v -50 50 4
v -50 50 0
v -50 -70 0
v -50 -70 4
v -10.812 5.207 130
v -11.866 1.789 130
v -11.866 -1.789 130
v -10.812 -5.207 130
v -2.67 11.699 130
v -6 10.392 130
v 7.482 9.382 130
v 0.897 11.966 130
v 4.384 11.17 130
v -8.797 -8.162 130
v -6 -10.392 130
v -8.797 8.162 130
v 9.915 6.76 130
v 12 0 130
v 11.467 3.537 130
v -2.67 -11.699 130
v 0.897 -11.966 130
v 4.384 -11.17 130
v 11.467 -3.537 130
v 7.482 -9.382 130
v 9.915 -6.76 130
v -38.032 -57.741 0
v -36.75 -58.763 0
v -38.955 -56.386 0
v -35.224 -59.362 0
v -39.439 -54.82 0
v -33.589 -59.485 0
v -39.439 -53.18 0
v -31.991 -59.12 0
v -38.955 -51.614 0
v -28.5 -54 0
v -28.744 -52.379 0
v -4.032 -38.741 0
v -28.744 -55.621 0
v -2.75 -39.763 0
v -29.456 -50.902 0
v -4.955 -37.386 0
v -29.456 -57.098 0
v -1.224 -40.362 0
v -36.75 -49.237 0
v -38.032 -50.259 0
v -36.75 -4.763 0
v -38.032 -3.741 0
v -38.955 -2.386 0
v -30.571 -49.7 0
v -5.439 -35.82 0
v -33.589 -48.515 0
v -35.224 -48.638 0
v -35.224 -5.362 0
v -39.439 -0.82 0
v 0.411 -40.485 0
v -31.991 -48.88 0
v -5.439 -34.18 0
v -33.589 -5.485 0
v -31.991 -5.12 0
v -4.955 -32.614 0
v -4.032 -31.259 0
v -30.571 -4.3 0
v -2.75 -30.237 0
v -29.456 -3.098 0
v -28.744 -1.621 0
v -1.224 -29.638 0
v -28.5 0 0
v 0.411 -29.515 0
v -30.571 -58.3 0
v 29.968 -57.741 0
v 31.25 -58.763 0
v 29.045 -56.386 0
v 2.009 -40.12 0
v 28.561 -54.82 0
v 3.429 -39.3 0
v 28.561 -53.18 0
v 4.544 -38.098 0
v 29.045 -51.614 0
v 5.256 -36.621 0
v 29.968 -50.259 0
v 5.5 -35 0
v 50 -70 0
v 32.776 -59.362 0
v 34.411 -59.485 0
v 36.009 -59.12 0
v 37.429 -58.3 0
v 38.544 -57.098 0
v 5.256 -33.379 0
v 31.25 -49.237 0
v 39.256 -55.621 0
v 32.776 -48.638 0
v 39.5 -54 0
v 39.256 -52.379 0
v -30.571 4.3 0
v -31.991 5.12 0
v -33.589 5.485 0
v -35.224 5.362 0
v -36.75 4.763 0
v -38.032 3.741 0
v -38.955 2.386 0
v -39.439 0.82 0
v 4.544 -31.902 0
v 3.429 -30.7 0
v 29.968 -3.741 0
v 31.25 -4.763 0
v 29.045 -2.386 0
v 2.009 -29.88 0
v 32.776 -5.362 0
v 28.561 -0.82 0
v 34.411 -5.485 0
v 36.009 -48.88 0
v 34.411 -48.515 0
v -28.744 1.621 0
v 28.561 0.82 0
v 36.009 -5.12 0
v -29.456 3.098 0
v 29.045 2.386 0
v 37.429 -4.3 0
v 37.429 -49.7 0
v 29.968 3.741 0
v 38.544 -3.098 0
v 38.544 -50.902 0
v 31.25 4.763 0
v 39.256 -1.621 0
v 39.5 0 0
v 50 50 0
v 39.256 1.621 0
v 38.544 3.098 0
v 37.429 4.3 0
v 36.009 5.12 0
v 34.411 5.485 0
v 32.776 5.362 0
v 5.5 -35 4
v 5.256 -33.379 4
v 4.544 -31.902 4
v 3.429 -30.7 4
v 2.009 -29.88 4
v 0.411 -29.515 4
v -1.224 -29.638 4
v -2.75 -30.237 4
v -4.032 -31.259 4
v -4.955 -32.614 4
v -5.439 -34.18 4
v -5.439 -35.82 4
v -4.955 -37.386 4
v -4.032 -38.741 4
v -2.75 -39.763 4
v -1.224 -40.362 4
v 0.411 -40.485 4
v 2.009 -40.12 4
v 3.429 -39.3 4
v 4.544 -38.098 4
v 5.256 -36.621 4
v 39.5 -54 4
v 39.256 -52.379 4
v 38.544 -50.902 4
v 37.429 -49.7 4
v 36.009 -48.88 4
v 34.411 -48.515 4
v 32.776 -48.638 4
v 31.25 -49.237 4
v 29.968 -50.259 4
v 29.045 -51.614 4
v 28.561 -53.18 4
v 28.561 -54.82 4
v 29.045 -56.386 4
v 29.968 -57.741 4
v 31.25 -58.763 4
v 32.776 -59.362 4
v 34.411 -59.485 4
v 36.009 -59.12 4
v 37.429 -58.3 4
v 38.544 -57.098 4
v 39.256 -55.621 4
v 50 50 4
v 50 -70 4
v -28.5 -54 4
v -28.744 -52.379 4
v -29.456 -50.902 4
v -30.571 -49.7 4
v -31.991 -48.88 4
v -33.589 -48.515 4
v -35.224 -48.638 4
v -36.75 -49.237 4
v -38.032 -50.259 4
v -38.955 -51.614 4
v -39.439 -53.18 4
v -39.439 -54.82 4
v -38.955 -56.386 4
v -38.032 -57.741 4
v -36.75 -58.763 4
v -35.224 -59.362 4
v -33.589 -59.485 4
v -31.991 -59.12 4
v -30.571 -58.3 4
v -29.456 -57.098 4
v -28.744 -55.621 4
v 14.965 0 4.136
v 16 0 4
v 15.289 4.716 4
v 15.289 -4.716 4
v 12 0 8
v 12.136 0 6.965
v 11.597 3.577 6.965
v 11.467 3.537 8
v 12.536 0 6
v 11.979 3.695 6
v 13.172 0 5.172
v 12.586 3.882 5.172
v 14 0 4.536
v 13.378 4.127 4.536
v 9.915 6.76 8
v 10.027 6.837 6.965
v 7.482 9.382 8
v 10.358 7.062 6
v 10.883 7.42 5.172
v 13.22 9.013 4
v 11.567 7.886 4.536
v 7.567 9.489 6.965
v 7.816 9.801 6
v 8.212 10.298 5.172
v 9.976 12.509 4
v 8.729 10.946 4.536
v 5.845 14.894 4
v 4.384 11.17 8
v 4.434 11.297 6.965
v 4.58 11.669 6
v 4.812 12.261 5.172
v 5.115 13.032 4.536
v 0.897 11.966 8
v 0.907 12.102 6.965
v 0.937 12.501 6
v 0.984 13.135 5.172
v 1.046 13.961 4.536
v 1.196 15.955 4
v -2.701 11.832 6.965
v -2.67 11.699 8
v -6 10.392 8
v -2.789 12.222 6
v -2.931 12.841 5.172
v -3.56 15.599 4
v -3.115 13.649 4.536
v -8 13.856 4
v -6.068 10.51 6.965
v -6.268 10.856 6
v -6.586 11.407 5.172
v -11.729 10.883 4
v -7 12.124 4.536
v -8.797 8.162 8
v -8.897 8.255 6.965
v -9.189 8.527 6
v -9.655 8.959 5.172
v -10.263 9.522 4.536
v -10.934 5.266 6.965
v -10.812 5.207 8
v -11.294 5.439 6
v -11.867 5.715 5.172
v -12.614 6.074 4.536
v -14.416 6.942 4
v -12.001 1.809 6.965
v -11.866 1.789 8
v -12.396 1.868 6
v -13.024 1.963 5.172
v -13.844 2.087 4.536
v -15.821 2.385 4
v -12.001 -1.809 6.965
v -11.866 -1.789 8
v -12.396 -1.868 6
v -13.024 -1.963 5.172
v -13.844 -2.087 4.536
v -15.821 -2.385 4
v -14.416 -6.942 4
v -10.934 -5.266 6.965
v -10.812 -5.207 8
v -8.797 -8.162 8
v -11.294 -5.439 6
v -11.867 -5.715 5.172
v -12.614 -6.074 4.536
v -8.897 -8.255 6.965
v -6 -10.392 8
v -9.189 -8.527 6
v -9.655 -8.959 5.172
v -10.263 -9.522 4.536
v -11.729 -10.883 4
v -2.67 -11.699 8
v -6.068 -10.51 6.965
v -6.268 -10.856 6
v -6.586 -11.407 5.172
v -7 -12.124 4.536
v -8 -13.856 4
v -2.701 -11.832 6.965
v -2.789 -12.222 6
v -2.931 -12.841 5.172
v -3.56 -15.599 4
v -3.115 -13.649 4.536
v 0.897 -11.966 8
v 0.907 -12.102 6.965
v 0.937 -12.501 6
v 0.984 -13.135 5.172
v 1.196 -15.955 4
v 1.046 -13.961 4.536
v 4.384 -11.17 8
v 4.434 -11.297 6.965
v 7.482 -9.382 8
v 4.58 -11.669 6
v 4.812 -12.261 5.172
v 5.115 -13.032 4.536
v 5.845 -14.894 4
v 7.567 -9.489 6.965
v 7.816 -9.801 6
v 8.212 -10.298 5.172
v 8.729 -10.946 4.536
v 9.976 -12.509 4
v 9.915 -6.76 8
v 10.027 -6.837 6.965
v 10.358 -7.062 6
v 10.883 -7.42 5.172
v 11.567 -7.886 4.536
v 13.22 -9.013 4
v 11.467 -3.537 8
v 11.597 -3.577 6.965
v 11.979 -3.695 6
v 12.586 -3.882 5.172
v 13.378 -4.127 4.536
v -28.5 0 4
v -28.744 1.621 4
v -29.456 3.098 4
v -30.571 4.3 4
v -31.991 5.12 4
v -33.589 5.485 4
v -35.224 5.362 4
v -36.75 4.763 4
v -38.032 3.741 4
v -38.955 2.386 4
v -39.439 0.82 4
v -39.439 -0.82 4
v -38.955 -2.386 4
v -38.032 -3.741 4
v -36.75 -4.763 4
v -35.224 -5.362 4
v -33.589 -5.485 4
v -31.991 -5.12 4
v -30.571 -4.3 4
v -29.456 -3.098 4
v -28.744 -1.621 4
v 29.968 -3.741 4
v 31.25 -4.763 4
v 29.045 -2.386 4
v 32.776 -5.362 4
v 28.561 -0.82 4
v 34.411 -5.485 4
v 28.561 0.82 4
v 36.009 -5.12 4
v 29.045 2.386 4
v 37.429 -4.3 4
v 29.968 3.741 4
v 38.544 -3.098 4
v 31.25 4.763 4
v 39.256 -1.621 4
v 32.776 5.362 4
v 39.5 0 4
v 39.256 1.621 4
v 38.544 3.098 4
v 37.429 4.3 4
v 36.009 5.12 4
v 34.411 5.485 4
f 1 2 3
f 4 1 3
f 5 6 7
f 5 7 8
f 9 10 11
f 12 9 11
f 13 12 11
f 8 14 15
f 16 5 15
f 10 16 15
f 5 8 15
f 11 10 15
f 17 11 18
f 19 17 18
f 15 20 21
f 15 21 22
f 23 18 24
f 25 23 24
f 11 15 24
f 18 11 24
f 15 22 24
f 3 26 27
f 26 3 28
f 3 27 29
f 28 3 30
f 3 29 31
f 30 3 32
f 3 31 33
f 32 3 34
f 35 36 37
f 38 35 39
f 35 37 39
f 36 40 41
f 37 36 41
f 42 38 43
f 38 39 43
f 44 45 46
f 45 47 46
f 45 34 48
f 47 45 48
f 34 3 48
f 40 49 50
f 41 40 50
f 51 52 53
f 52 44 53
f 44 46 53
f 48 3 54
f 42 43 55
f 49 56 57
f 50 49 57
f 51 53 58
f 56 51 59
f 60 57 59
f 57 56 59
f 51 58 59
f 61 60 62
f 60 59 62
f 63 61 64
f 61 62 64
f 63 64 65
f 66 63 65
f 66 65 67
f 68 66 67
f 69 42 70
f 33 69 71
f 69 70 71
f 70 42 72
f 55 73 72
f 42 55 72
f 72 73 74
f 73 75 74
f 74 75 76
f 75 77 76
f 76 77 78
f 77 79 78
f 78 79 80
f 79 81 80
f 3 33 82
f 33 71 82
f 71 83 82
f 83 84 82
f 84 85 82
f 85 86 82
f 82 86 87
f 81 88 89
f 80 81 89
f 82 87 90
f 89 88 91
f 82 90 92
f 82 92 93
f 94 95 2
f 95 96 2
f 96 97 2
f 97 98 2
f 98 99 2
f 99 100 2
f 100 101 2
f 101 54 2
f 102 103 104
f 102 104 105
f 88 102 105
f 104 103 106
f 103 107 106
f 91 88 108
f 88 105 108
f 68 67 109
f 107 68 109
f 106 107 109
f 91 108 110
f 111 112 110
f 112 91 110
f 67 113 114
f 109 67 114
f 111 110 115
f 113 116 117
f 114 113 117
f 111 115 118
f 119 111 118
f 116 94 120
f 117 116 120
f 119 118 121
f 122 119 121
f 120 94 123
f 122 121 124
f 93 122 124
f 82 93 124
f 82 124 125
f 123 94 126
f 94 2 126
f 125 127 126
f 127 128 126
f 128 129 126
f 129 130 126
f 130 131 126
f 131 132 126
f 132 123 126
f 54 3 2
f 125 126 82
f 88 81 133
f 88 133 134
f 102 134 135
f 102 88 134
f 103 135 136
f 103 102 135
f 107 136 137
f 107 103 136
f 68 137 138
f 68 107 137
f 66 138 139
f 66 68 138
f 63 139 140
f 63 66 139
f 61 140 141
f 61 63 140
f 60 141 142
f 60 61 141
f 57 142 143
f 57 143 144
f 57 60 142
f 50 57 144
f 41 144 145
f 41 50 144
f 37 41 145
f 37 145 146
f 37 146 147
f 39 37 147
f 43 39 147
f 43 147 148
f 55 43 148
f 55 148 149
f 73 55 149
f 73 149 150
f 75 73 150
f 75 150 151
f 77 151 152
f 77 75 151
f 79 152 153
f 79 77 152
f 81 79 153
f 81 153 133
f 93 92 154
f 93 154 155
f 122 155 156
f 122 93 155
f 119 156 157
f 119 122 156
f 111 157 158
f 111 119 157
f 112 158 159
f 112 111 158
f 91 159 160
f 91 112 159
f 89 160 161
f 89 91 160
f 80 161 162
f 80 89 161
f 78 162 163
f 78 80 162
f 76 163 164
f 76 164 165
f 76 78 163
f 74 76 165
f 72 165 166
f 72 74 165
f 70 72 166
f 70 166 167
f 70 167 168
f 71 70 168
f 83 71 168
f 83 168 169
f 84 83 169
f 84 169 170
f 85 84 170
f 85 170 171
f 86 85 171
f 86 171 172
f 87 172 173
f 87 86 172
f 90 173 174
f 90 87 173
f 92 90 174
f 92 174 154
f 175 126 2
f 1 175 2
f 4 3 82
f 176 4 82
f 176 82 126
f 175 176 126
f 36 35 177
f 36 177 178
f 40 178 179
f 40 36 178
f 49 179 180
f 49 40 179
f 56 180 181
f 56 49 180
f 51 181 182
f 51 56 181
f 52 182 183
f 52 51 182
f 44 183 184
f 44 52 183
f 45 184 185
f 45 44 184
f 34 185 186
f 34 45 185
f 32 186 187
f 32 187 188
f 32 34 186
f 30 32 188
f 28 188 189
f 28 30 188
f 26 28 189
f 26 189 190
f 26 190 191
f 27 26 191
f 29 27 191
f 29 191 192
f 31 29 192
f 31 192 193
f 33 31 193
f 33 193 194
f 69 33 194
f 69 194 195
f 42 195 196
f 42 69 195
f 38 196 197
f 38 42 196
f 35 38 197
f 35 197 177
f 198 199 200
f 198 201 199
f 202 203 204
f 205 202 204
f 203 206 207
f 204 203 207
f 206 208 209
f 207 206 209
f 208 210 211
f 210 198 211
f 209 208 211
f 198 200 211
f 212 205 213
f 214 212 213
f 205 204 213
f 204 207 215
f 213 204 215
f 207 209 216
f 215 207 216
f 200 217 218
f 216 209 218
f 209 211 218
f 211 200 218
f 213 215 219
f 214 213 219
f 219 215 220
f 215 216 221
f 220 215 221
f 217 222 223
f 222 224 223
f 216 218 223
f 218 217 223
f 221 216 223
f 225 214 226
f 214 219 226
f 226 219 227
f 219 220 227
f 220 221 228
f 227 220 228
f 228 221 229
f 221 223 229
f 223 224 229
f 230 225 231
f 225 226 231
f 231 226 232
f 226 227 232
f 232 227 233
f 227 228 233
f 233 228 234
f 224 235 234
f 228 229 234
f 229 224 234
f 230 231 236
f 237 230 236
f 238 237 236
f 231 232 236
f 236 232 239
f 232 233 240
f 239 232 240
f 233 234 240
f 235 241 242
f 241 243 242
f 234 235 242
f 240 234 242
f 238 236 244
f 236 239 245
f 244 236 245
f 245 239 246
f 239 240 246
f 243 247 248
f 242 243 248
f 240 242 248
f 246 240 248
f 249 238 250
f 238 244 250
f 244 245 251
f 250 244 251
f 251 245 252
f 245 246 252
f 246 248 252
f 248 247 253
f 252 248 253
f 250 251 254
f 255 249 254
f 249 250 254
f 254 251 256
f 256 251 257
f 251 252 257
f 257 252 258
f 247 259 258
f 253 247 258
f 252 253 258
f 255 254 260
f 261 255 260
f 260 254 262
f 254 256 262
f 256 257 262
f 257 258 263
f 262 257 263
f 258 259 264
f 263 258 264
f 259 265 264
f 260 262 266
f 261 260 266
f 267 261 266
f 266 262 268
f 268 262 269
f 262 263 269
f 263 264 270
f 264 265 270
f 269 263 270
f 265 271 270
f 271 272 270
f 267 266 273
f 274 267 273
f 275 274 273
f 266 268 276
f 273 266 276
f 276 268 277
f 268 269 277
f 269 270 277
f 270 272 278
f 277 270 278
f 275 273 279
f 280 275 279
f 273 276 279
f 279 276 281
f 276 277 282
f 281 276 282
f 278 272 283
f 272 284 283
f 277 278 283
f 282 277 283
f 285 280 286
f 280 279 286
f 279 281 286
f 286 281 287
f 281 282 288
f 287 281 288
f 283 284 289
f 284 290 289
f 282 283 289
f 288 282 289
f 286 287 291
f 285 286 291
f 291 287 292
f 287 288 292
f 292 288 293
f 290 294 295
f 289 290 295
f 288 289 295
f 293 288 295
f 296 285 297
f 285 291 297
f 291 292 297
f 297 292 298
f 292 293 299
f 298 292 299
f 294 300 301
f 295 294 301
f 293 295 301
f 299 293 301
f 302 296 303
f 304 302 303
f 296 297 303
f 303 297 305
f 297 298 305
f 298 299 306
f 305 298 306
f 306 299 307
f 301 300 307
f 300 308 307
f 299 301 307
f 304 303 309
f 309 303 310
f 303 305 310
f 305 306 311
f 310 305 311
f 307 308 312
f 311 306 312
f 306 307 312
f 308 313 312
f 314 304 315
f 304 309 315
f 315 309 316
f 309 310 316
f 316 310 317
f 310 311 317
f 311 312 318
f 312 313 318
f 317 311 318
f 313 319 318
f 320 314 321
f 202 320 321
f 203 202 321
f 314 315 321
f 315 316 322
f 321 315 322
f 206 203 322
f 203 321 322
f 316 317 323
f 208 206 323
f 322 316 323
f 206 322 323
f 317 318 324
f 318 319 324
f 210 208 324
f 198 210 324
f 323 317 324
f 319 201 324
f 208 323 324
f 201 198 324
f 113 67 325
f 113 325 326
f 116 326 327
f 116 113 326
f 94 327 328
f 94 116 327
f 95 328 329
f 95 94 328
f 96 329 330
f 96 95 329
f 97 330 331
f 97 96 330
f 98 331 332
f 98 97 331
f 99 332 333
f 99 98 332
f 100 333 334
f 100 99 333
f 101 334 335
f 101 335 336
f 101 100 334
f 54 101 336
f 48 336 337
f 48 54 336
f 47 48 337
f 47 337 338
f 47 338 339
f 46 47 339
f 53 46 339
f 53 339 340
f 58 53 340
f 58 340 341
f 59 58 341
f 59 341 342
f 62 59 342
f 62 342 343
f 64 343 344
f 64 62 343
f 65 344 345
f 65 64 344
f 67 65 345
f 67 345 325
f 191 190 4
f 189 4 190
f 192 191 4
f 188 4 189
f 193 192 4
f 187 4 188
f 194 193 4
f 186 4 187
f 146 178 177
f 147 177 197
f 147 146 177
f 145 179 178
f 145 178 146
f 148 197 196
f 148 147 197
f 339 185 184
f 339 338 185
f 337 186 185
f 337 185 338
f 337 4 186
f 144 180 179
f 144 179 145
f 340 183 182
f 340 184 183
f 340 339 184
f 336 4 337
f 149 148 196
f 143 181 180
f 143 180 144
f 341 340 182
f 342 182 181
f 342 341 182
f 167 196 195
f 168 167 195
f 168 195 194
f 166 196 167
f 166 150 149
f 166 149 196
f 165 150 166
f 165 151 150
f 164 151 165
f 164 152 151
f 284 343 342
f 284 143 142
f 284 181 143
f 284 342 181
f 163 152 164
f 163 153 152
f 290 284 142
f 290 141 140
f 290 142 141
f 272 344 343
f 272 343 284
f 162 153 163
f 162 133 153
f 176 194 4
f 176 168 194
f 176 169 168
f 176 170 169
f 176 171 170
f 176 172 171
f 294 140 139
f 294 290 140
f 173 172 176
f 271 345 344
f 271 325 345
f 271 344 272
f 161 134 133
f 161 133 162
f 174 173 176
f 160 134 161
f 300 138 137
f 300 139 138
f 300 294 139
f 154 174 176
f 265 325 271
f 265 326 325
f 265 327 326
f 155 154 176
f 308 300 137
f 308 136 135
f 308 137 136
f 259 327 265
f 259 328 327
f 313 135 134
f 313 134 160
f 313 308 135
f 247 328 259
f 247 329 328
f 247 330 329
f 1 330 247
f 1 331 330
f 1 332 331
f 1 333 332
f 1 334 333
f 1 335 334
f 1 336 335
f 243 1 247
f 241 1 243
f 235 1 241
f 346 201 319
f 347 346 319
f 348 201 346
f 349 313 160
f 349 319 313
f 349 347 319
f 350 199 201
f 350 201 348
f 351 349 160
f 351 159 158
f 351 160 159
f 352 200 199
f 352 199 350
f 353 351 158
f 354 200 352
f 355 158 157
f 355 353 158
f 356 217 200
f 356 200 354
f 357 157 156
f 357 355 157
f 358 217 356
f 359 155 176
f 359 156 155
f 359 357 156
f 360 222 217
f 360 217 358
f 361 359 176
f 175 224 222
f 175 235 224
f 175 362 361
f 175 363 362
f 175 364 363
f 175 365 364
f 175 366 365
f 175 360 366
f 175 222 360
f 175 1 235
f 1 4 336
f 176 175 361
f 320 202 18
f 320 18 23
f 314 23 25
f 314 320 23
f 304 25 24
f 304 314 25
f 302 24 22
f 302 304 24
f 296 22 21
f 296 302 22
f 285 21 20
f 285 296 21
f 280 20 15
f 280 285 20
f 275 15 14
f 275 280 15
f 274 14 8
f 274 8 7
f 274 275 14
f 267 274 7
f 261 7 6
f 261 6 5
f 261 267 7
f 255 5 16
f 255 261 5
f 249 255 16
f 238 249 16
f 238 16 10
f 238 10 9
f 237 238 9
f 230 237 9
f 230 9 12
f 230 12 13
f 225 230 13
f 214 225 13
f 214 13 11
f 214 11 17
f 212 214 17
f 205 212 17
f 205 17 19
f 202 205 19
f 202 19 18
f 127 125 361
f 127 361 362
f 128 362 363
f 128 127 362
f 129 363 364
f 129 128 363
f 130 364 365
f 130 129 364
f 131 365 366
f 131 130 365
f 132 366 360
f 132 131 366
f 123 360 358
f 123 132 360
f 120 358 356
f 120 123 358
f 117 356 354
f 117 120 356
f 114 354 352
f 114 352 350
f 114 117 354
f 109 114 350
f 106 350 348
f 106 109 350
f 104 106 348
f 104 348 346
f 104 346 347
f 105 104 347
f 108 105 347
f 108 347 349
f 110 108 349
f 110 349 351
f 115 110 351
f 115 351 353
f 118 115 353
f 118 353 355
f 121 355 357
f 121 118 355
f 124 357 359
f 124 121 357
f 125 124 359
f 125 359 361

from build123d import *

# Parameters (mm, degrees)
F0_R     = 5.5
F0_R_2   = 12
F1_DEPTH = 4
F2_R     = 12
F3_DEPTH = 130
F4_R     = 4


with BuildPart() as f1:
    # F0 (on Top) → F1 (new body)
    with BuildSketch(Plane.XY):
        Polygon((50, 50), (0, 50), (-50, 50), (-50, -70), (0, -70), (50, -70), align=None)
        with Locations((-34, -54)):
            Circle(F0_R, mode=Mode.SUBTRACT)
        with Locations((34, -54)):
            Circle(F0_R, mode=Mode.SUBTRACT)
        with Locations((0, -35)):
            Circle(F0_R, mode=Mode.SUBTRACT)
        with Locations((-34, 0)):
            Circle(F0_R, mode=Mode.SUBTRACT)
        Circle(F0_R_2, mode=Mode.SUBTRACT)
        with Locations((34, 0)):
            Circle(F0_R, mode=Mode.SUBTRACT)
    extrude(amount=F1_DEPTH)

    # F2 (on face) → F3 (join)
    with BuildSketch(Plane(origin=(0, 0, 0), x_dir=(1, 0, 0), z_dir=(0, 0, -1))):
        Circle(F2_R)
    extrude(amount=-F3_DEPTH)

    # F4
    f4_edges = [f1.edges().sort_by_distance(p)[0] for p in [
        (-12, 0, 4),
    ]]
    fillet(f4_edges, radius=F4_R)


solid = f1.part
